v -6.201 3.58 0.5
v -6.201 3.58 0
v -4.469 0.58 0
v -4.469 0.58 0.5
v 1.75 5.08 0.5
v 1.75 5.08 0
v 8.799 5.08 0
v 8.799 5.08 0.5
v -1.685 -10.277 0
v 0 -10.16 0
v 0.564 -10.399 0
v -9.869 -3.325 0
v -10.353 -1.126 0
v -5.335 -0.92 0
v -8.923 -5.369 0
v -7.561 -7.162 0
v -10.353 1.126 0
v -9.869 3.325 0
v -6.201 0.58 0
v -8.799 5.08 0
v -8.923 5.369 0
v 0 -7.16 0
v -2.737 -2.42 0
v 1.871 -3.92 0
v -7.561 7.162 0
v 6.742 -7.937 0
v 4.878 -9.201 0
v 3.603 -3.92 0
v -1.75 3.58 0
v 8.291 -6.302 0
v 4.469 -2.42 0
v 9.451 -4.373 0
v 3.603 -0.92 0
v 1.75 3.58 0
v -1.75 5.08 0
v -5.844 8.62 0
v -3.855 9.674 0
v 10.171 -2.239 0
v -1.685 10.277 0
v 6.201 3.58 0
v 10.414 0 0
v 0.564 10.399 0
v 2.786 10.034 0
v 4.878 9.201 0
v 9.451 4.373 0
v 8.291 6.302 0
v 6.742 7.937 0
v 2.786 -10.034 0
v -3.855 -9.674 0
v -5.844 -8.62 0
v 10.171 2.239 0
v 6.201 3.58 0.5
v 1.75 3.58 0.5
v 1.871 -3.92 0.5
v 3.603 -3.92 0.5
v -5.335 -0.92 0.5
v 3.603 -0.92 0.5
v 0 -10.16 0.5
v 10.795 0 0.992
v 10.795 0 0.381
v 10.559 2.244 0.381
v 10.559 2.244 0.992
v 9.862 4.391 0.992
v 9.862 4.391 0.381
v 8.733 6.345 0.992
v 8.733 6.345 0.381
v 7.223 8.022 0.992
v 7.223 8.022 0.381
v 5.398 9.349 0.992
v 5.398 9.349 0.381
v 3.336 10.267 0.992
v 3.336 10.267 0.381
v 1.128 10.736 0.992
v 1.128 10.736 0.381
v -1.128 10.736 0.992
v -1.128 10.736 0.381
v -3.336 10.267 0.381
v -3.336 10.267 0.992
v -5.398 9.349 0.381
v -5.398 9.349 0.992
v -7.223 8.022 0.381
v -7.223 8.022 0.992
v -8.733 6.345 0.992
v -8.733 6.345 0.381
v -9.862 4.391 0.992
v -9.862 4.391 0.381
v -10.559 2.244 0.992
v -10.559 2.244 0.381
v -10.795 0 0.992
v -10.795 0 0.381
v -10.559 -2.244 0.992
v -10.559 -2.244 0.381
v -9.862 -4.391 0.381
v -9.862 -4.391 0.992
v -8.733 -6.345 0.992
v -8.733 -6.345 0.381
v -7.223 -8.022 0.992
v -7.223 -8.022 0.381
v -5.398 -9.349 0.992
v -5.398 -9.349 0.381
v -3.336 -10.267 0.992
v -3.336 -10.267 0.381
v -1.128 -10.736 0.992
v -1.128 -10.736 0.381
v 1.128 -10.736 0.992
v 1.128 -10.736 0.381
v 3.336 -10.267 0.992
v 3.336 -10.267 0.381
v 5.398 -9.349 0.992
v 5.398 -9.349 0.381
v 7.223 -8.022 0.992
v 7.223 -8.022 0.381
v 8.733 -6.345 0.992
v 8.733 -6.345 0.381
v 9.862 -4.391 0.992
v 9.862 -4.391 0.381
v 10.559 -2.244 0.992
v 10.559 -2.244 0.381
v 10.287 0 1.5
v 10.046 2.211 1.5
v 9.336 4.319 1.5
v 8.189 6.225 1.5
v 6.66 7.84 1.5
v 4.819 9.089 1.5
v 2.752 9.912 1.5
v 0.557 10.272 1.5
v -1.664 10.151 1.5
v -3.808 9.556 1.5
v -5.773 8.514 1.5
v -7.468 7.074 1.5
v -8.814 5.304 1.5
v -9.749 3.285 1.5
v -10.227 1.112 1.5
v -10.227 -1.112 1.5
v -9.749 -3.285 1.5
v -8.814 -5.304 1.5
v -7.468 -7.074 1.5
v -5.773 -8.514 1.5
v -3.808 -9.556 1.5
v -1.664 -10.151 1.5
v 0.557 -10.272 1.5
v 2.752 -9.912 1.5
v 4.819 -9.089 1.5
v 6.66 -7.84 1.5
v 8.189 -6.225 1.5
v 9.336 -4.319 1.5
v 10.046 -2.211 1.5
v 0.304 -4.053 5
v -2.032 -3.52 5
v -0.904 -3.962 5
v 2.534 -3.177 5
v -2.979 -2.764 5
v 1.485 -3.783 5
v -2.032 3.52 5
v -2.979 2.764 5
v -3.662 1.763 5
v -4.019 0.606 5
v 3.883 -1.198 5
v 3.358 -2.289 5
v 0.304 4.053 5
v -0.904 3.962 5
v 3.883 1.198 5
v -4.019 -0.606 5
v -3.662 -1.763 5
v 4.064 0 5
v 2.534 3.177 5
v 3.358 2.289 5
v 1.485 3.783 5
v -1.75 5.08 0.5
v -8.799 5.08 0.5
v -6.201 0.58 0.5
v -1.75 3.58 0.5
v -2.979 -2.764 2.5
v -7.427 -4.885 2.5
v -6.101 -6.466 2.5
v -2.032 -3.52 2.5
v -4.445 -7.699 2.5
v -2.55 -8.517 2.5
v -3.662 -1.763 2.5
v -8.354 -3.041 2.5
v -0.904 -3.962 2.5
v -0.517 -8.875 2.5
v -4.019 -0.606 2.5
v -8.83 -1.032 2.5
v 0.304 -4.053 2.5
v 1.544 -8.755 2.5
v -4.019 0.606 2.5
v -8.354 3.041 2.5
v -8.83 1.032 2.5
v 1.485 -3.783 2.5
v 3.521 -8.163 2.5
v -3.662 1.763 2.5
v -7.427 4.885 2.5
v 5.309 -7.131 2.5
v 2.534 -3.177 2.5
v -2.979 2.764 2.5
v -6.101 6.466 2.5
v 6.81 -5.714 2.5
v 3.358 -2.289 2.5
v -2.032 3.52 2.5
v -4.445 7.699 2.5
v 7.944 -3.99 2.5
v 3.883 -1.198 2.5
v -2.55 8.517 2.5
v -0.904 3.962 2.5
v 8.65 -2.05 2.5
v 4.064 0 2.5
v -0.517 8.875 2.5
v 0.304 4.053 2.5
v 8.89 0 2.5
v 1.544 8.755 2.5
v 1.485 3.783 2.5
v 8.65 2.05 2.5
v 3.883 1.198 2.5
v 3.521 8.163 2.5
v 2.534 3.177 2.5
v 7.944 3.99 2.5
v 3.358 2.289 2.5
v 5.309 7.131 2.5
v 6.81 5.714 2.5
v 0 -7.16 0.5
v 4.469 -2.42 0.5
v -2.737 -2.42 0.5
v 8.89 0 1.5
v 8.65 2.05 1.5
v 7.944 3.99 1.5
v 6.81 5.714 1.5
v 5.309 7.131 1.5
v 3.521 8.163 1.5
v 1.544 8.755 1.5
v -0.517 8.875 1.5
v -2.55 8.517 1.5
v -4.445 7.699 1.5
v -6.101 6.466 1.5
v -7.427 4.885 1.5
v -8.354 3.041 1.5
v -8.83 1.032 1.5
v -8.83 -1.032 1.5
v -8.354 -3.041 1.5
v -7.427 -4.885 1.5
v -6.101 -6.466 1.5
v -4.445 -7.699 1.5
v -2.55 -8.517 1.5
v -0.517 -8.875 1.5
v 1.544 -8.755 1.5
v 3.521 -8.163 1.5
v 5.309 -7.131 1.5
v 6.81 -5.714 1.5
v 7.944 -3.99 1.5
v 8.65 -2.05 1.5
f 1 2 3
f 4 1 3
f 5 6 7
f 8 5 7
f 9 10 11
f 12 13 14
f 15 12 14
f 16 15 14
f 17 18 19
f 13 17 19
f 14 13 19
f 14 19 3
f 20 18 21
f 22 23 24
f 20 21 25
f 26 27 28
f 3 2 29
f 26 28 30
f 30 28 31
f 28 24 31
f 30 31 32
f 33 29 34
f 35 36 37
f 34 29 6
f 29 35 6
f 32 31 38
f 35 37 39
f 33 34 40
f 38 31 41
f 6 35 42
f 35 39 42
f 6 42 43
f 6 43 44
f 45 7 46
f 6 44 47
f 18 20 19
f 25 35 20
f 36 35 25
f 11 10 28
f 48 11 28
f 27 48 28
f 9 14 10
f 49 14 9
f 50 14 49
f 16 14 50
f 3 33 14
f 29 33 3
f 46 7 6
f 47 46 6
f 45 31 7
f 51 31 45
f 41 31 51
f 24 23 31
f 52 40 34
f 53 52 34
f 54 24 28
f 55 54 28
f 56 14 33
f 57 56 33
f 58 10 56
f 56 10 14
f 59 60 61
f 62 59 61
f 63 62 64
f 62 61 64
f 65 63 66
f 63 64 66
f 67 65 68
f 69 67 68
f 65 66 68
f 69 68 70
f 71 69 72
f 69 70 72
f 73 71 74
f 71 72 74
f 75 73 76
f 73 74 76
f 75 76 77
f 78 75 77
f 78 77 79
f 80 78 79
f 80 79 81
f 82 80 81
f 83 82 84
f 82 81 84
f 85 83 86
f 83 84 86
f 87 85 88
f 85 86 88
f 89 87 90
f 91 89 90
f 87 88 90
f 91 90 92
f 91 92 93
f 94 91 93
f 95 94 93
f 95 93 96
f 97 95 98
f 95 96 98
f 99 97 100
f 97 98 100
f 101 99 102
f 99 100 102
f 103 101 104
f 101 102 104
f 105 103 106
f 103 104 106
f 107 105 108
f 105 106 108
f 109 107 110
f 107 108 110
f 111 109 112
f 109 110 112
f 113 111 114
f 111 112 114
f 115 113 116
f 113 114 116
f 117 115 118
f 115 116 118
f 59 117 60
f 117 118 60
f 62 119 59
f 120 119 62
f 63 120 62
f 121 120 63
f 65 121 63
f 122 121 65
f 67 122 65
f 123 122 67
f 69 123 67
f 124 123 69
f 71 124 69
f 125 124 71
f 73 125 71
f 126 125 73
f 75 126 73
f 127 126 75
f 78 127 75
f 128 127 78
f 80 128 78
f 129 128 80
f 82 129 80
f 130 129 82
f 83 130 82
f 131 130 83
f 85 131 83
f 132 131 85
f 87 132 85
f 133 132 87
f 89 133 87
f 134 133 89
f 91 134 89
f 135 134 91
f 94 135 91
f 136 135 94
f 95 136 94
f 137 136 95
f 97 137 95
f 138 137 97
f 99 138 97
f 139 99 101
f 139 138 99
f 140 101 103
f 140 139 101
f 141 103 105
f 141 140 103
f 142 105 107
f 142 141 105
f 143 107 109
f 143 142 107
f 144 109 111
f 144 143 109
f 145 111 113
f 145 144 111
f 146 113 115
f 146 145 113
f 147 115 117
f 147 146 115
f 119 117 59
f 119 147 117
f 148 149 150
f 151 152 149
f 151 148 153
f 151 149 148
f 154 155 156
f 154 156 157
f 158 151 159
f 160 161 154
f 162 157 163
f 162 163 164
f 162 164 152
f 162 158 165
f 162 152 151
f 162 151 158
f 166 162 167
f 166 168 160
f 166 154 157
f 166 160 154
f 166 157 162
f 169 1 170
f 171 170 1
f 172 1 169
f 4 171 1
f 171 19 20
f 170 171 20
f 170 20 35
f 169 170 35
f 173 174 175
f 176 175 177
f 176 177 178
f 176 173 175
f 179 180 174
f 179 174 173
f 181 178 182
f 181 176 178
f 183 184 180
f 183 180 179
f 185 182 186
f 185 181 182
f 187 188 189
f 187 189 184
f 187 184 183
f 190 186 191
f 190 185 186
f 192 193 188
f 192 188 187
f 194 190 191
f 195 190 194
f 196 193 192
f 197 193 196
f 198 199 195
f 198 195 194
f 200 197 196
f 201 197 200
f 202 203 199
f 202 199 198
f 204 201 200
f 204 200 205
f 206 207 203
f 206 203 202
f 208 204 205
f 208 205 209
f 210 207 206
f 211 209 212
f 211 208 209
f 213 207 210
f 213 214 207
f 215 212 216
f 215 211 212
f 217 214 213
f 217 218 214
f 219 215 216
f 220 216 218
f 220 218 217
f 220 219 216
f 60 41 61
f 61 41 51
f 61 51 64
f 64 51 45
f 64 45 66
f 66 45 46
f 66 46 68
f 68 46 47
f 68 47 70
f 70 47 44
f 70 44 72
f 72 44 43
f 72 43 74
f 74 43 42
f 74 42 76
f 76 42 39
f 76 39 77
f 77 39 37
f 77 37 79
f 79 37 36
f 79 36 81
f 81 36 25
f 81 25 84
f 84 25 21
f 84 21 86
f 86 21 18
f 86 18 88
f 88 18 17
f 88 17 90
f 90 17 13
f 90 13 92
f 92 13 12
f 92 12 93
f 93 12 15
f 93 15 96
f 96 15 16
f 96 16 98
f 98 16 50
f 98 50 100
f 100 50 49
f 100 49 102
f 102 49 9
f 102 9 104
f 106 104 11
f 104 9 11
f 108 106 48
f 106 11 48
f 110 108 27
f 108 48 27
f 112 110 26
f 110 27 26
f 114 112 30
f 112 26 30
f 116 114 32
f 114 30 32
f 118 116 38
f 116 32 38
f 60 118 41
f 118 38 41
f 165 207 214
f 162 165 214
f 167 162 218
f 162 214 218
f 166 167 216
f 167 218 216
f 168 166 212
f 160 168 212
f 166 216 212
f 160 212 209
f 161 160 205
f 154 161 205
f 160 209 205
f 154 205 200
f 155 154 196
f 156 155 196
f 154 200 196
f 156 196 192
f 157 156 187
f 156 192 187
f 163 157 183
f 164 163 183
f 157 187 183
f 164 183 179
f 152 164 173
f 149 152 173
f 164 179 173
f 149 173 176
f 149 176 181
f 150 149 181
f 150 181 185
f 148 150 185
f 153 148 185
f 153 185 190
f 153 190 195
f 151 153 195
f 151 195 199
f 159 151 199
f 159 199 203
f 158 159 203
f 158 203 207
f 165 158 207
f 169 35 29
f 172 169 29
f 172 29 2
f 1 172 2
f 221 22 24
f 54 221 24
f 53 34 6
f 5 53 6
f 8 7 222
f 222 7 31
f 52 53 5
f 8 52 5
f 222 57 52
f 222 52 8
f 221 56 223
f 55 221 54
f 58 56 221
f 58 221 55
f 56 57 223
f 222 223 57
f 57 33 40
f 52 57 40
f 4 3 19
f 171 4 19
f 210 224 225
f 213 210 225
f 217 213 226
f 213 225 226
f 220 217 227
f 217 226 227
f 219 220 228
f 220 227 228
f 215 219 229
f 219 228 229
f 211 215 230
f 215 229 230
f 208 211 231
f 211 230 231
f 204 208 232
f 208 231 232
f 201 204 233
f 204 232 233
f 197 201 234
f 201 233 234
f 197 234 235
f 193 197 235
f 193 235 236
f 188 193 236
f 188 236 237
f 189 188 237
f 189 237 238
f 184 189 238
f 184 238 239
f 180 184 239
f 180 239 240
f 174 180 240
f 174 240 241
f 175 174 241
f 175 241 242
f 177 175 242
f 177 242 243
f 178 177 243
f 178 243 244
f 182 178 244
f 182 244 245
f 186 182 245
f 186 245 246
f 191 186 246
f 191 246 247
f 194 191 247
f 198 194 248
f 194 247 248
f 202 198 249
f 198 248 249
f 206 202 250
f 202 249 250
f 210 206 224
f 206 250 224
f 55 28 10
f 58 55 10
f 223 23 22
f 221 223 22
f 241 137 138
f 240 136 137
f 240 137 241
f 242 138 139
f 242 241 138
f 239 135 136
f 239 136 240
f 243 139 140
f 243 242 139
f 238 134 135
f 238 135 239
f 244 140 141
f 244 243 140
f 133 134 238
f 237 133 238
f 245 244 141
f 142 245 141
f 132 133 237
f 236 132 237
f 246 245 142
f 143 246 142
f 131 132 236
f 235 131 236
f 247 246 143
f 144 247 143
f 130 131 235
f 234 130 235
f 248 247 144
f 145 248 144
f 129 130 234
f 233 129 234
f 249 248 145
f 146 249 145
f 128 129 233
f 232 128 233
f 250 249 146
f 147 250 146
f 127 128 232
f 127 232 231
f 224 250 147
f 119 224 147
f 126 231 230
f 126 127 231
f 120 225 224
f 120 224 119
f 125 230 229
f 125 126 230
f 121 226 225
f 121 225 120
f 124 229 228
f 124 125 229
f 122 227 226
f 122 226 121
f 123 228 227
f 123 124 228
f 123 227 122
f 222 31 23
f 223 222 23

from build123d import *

# Parameters (mm, degrees)
F0_R     = 4.064
F1_DEPTH = 5
F0_R_2   = 8.89
F2_DEPTH = 2.5
F0_R_3   = 10.795
F3_DEPTH = 1.5
F5_DEPTH = 0.5
F6_SIZE  = 0.508
F7_SIZE  = 0.381


with BuildPart() as f1:
    # F0 (on Top) → F1 (new body)
    with BuildSketch(Plane.XY):
        Circle(F0_R)
    extrude(amount=F1_DEPTH)

    # F0 (on Top) → F2 (join)
    with BuildSketch(Plane.XY):
        Circle(F0_R_2)
        Circle(F0_R, mode=Mode.SUBTRACT)
    extrude(amount=F2_DEPTH)

    # F0 (on Top) → F3 (join)
    with BuildSketch(Plane.XY):
        Circle(F0_R_3)
        Circle(F0_R_2, mode=Mode.SUBTRACT)
    extrude(amount=F3_DEPTH)

    # F4 (on face) → F5 (cut)
    with BuildSketch(Plane(origin=(0, 0, 0), x_dir=(1, 0, 0), z_dir=(0, 0, -1))):
        Polygon((-6.200742, -0.58), (-8.798818, -5.08), (-1.75, -5.08), (-1.75, -3.58), (-6.200742, -3.58), (-4.468691, -0.58), align=None)
        Polygon((0, 10.16), (-5.334716, 0.92), (-3.602666, 0.92), (-2.73664, 2.42), (0, 7.16), (1.870615, 3.92), (3.602666, 3.92), align=None)
        Polygon((1.75, -3.58), (1.75, -5.08), (8.798818, -5.08), (4.468691, 2.42), (2.73664, 2.42), (3.602666, 0.92), (6.200742, -3.58), align=None)
        Polygon((-2.73664, 2.42), (-3.602666, 0.92), (3.602666, 0.92), (2.73664, 2.42), align=None)
    extrude(amount=-F5_DEPTH, mode=Mode.SUBTRACT)

    # F6
    f6_edges = [f1.edges().sort_by_distance(p)[0] for p in [
        (-10.795, 0, 1.5),
    ]]
    chamfer(f6_edges, length=F6_SIZE)

    # F7
    f7_edges = [f1.edges().sort_by_distance(p)[0] for p in [
        (-10.795, 0, 0),
    ]]
    chamfer(f7_edges, length=F7_SIZE)


solid = f1.part
